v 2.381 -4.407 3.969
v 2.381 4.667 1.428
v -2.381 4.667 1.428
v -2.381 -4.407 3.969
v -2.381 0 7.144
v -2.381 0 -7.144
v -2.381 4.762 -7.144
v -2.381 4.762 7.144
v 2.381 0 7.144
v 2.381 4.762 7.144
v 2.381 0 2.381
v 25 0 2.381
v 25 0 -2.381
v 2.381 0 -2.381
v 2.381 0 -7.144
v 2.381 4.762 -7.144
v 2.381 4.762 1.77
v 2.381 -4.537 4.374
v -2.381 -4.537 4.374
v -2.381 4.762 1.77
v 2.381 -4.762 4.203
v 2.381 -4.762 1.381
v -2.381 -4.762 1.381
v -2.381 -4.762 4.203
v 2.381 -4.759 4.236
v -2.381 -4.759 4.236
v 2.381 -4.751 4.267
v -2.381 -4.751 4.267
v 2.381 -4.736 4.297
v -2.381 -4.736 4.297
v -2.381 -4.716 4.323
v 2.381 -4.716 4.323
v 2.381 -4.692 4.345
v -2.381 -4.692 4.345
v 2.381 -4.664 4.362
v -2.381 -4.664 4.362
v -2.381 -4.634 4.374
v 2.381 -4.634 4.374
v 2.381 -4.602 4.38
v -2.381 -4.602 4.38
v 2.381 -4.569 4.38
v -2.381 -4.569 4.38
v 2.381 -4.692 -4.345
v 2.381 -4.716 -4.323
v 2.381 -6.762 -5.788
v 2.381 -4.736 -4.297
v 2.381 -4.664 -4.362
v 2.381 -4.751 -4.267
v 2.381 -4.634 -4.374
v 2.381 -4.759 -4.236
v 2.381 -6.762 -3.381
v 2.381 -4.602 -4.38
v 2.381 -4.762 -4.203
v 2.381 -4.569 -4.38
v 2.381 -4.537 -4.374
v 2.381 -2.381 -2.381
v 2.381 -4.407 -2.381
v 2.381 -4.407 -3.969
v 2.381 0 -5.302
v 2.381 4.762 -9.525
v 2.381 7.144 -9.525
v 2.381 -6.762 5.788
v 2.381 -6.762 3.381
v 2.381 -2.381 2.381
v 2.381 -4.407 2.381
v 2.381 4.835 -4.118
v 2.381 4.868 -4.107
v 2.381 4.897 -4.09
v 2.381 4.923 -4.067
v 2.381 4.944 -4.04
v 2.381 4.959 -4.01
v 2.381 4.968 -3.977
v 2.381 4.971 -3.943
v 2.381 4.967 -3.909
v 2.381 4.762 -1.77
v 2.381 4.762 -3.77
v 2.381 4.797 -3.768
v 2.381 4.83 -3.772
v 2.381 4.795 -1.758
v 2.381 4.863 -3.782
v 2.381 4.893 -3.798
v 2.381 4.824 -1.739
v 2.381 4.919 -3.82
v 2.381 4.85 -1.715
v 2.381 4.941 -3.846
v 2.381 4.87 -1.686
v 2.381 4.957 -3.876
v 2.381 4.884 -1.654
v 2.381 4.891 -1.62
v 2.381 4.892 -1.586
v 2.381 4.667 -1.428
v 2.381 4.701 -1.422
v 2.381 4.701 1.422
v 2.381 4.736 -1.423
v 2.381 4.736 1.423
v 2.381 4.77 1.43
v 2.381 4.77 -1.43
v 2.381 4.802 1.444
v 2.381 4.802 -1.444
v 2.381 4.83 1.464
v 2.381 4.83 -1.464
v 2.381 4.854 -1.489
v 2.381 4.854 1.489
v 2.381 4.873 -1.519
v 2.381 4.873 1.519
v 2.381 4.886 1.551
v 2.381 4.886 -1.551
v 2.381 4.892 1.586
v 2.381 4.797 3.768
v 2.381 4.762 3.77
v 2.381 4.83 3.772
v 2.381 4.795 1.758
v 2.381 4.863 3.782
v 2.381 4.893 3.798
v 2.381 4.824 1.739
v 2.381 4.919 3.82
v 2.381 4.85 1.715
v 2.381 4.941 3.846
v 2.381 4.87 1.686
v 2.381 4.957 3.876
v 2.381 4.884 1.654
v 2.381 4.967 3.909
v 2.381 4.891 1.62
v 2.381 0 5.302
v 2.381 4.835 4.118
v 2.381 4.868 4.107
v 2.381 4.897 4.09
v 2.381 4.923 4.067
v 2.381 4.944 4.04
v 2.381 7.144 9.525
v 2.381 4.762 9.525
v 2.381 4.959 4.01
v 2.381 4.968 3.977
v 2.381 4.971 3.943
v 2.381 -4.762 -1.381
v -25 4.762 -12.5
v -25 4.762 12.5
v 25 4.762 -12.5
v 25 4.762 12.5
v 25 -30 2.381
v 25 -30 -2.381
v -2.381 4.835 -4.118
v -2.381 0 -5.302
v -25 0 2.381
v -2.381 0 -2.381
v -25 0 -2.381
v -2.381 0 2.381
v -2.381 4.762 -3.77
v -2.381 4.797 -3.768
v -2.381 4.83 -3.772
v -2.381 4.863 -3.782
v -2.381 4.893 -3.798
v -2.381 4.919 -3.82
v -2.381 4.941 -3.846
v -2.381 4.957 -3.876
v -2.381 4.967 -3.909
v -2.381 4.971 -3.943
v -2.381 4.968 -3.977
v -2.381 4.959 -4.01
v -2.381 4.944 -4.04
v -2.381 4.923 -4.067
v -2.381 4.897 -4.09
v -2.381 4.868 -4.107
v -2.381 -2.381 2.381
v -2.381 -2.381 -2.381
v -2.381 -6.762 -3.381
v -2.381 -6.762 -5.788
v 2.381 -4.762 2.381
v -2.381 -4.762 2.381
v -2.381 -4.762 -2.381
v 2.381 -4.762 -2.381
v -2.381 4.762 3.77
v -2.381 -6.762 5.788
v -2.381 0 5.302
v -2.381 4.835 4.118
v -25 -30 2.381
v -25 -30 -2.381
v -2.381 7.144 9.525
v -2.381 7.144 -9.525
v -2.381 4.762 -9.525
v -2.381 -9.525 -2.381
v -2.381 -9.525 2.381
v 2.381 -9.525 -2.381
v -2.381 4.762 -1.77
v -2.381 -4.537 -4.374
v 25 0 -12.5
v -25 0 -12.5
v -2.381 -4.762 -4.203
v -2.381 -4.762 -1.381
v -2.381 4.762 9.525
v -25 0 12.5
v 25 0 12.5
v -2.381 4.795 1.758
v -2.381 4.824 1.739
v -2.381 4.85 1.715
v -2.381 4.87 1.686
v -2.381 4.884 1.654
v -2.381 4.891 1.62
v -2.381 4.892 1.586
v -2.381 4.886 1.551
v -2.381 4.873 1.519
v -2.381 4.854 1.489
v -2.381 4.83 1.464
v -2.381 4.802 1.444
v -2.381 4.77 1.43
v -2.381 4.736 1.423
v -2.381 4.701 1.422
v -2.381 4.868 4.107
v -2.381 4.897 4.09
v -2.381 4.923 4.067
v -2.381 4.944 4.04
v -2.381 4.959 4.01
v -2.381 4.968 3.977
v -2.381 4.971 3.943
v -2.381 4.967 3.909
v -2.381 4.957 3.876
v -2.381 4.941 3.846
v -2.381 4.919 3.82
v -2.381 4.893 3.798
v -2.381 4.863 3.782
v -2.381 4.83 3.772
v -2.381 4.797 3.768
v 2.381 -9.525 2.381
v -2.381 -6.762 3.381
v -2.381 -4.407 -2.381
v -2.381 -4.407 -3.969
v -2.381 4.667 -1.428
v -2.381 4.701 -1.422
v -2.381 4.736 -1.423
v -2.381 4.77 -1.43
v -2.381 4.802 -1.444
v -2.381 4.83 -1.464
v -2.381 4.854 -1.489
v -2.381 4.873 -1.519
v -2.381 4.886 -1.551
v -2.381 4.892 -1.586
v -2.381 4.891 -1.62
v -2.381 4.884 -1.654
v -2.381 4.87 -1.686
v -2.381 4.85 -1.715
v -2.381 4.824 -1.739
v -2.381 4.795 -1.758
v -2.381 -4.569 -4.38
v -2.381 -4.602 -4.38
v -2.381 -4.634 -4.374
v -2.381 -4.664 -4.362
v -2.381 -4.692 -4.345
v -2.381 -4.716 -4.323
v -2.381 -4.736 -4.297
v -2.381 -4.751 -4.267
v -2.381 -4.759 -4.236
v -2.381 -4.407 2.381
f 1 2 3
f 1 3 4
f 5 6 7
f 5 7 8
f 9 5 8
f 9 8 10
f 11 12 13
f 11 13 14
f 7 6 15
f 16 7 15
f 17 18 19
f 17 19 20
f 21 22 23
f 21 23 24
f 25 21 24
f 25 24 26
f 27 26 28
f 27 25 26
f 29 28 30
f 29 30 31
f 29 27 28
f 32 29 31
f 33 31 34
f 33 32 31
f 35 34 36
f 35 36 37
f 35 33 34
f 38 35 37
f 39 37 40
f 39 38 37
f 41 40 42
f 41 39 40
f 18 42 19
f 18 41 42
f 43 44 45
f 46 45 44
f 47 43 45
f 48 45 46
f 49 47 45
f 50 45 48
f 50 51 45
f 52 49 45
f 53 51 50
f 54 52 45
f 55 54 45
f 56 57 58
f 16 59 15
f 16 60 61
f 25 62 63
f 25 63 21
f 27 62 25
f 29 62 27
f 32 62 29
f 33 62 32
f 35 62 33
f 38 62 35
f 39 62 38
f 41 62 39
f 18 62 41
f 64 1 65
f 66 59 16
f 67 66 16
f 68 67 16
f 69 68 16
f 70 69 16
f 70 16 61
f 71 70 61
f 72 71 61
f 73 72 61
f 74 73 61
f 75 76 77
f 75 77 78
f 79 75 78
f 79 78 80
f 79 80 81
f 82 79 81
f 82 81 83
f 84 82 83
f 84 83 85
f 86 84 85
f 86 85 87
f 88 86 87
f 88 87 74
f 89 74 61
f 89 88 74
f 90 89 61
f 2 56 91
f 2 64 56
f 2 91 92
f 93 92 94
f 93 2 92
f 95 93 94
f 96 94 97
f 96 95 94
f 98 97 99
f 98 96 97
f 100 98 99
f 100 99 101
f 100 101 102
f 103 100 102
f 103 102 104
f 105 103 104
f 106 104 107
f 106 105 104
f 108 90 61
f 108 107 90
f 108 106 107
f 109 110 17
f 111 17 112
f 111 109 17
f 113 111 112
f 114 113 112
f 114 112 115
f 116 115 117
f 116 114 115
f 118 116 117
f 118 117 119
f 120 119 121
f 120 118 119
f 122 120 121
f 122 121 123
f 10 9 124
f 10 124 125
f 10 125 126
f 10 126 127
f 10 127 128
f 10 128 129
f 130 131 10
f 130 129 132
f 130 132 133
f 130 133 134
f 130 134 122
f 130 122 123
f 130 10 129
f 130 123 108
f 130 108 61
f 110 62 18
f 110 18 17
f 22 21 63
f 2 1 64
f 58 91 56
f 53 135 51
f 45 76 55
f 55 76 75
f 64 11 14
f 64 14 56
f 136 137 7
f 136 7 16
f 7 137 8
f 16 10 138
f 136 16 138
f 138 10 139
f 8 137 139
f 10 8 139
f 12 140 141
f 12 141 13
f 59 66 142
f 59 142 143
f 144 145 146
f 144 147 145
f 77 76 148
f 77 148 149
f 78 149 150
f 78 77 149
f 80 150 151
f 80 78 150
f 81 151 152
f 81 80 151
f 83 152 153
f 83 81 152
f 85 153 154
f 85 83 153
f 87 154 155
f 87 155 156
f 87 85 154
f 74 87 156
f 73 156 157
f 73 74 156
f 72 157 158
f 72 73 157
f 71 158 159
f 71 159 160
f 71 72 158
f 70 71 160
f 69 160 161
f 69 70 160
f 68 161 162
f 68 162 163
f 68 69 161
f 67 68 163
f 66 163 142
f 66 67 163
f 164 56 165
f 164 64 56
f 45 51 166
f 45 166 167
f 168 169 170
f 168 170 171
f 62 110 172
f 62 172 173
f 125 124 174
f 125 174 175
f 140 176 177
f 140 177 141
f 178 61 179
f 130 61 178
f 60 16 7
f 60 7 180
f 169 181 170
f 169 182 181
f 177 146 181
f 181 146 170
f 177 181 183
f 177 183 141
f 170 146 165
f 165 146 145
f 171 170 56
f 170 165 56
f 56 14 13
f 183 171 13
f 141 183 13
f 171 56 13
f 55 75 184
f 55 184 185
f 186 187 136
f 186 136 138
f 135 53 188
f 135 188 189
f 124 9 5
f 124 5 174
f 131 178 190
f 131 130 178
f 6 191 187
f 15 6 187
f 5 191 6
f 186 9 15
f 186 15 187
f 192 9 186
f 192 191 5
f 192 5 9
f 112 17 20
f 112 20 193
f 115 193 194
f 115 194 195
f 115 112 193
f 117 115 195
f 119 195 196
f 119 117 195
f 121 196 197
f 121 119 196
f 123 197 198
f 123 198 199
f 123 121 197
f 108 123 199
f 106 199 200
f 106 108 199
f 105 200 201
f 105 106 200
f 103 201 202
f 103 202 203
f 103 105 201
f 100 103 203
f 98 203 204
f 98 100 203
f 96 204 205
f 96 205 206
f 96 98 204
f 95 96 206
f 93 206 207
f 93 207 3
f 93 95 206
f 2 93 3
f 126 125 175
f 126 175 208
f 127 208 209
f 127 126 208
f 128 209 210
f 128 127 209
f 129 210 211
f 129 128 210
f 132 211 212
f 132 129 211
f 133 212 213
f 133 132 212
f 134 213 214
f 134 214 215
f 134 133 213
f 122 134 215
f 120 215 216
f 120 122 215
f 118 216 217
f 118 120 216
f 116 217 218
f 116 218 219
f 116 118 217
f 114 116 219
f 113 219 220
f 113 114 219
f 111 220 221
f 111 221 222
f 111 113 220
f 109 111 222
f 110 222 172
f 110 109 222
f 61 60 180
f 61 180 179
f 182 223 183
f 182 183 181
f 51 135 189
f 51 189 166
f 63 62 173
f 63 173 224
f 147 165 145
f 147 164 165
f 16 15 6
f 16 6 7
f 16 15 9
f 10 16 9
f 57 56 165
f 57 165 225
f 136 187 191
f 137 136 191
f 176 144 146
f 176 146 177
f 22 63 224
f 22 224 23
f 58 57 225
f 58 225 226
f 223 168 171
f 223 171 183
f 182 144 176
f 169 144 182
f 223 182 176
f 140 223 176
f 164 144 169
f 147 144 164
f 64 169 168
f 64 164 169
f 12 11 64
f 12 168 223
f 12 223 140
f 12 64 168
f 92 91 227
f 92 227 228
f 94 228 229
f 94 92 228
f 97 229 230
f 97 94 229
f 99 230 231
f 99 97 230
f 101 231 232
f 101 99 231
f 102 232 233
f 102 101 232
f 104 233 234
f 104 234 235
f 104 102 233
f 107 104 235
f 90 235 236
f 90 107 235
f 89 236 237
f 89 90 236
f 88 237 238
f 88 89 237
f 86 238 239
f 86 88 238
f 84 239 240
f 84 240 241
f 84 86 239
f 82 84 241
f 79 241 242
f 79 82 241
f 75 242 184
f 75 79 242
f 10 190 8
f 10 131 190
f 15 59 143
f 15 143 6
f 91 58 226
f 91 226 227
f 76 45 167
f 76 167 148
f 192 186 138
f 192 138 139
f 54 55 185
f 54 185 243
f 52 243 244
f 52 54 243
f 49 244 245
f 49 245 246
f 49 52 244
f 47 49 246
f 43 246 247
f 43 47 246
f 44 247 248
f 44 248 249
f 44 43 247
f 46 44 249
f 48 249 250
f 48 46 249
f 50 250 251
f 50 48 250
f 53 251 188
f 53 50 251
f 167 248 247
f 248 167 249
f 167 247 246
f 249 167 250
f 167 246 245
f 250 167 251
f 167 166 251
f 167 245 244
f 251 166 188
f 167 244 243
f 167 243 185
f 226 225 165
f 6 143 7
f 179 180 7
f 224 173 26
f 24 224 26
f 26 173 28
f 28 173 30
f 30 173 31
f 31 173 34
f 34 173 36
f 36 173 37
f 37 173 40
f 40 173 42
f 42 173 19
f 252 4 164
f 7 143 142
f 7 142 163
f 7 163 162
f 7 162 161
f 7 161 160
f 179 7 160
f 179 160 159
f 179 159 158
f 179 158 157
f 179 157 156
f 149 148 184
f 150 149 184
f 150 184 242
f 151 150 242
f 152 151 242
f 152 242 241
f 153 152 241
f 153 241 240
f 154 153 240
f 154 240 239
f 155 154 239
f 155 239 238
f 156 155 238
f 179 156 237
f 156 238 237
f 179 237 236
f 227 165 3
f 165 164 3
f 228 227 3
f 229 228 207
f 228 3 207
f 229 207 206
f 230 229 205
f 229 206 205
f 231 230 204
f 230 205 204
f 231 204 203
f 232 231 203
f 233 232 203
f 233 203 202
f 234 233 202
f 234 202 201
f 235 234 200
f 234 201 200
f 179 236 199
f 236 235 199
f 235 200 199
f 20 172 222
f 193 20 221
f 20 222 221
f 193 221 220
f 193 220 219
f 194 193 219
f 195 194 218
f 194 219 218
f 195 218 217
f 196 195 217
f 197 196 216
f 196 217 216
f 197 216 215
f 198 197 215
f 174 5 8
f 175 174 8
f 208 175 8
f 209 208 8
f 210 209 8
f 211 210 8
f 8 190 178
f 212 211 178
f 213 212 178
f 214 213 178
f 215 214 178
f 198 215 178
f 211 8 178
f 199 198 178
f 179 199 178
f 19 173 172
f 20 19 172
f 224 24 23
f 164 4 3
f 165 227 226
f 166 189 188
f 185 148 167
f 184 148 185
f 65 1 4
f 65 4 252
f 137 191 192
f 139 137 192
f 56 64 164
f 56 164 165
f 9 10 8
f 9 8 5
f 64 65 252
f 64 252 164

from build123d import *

# Parameters (mm, degrees)
F2_DEPTH = 2.38125
F3_W     = 50
F3_H     = 25
F3_W_2   = 4.7625
F3_H_2   = 14.2875
F4_DEPTH = 4.7625
F6_DEPTH = 2.38125


# Not quite as in the source:
# - a length typed as a fraction of an inch, garbled in the dataset ("3 / 203.2 mm" for 3/8 in), is restored


with BuildPart() as f2:
    # F1 (on Top) → F2 (new body, symmetric)
    with BuildSketch(Plane.XY):
        Polygon((-2.38125, 0), (-25, 0), (-25, -30), (0, -30), (25, -30), (25, 0), (2.38125, 0), (2.38125, -2.38125), (0, -2.38125), (-2.38125, -2.38125), align=None)
        Polygon((-2.38125, -4.7625), (0, -4.7625), (2.38125, -4.7625), (2.38125, -9.525), (0, -9.525), (-2.38125, -9.525), align=None, mode=Mode.SUBTRACT)
    extrude(amount=F2_DEPTH, both=True)


with BuildPart() as f4:
    # F3 (on Front) → F4 (new body)
    with BuildSketch(Plane.XZ):
        Rectangle(F3_W, F3_H)
        Rectangle(F3_W_2, F3_H_2, mode=Mode.SUBTRACT)
    extrude(amount=-F4_DEPTH)


with BuildPart() as f6:
    # F5 (on Right) → F6 (new body, symmetric)
    with BuildSketch(Plane.YZ):
        with BuildLine():
            Line((4.7625, 9.525), (4.7625, 7.14375))
            Line((4.7625, 7.14375), (0, 7.14375))
            Line((0, 7.14375), (0, 5.3015985947))
            Line((0, 5.3015985947), (4.8354205115, 4.1182366897))
            ThreePointArc((4.8354205115, 4.1182366897), (4.9671724392, 3.9090526811), (4.7625, 3.7703958653))
            Line((4.7625, 3.7703958653), (-6.7625, 5.7876744365))
            Line((-6.7625, 5.7876744365), (-6.7625, 3.38125))
            Line((-6.7625, 3.38125), (-4.7625, 1.38125))
            Line((-4.7625, 1.38125), (-4.7625, 2.38125))
            Line((-4.7625, 2.38125), (-4.7625, 4.2031772012))
            ThreePointArc((-4.7625, 4.2031772012), (-4.6921440652, 4.3448409329), (-4.5367563233, 4.3743912306))
            Line((-4.5367563233, 4.3743912306), (4.7625, 1.7703958653))
            ThreePointArc((4.7625, 1.7703958653), (4.8857703527, 1.5512381592), (4.6666126465, 1.4279678065))
            Line((4.6666126465, 1.4279678065), (-4.4069, 3.96875))
            Line((-4.4069, 3.96875), (-4.4069, 2.38125))
            Line((-4.4069, 2.38125), (-2.38125, 2.38125))
            Line((-2.38125, 2.38125), (-2.38125, 0))
            Line((-2.38125, 0), (-2.38125, -2.38125))
            Line((-2.38125, -2.38125), (-4.4069, -2.38125))
            Line((-4.4069, -2.38125), (-4.4069, -3.96875))
            Line((-4.4069, -3.96875), (4.6666126465, -1.4279678065))
            ThreePointArc((4.6666126465, -1.4279678065), (4.8857703527, -1.5512381592), (4.7625, -1.7703958653))
            Line((4.7625, -1.7703958653), (-4.5367563233, -4.3743912306))
            ThreePointArc((-4.5367563233, -4.3743912306), (-4.6921440652, -4.3448409329), (-4.7625, -4.2031772012))
            Line((-4.7625, -4.2031772012), (-4.7625, -2.38125))
            Line((-4.7625, -2.38125), (-4.7625, -1.38125))
            Line((-4.7625, -1.38125), (-6.7625, -3.38125))
            Line((-6.7625, -3.38125), (-6.7625, -5.7876744365))
            Line((-6.7625, -5.7876744365), (4.7625, -3.7703958653))
            ThreePointArc((4.7625, -3.7703958653), (4.9671724392, -3.9090526811), (4.8354205115, -4.1182366897))
            Line((4.8354205115, -4.1182366897), (0, -5.3015985947))
            Line((0, -5.3015985947), (0, -7.14375))
            Line((0, -7.14375), (4.7625, -7.14375))
            Line((4.7625, -7.14375), (4.7625, -9.525))
            Line((4.7625, -9.525), (7.14375, -9.525))
            Line((7.14375, -9.525), (7.14375, 0))
            Line((7.14375, 0), (7.14375, 9.525))
            Line((7.14375, 9.525), (4.7625, 9.525))
        make_face()
    extrude(amount=F6_DEPTH, both=True)


solid = Compound([f2.part, f4.part, f6.part])
